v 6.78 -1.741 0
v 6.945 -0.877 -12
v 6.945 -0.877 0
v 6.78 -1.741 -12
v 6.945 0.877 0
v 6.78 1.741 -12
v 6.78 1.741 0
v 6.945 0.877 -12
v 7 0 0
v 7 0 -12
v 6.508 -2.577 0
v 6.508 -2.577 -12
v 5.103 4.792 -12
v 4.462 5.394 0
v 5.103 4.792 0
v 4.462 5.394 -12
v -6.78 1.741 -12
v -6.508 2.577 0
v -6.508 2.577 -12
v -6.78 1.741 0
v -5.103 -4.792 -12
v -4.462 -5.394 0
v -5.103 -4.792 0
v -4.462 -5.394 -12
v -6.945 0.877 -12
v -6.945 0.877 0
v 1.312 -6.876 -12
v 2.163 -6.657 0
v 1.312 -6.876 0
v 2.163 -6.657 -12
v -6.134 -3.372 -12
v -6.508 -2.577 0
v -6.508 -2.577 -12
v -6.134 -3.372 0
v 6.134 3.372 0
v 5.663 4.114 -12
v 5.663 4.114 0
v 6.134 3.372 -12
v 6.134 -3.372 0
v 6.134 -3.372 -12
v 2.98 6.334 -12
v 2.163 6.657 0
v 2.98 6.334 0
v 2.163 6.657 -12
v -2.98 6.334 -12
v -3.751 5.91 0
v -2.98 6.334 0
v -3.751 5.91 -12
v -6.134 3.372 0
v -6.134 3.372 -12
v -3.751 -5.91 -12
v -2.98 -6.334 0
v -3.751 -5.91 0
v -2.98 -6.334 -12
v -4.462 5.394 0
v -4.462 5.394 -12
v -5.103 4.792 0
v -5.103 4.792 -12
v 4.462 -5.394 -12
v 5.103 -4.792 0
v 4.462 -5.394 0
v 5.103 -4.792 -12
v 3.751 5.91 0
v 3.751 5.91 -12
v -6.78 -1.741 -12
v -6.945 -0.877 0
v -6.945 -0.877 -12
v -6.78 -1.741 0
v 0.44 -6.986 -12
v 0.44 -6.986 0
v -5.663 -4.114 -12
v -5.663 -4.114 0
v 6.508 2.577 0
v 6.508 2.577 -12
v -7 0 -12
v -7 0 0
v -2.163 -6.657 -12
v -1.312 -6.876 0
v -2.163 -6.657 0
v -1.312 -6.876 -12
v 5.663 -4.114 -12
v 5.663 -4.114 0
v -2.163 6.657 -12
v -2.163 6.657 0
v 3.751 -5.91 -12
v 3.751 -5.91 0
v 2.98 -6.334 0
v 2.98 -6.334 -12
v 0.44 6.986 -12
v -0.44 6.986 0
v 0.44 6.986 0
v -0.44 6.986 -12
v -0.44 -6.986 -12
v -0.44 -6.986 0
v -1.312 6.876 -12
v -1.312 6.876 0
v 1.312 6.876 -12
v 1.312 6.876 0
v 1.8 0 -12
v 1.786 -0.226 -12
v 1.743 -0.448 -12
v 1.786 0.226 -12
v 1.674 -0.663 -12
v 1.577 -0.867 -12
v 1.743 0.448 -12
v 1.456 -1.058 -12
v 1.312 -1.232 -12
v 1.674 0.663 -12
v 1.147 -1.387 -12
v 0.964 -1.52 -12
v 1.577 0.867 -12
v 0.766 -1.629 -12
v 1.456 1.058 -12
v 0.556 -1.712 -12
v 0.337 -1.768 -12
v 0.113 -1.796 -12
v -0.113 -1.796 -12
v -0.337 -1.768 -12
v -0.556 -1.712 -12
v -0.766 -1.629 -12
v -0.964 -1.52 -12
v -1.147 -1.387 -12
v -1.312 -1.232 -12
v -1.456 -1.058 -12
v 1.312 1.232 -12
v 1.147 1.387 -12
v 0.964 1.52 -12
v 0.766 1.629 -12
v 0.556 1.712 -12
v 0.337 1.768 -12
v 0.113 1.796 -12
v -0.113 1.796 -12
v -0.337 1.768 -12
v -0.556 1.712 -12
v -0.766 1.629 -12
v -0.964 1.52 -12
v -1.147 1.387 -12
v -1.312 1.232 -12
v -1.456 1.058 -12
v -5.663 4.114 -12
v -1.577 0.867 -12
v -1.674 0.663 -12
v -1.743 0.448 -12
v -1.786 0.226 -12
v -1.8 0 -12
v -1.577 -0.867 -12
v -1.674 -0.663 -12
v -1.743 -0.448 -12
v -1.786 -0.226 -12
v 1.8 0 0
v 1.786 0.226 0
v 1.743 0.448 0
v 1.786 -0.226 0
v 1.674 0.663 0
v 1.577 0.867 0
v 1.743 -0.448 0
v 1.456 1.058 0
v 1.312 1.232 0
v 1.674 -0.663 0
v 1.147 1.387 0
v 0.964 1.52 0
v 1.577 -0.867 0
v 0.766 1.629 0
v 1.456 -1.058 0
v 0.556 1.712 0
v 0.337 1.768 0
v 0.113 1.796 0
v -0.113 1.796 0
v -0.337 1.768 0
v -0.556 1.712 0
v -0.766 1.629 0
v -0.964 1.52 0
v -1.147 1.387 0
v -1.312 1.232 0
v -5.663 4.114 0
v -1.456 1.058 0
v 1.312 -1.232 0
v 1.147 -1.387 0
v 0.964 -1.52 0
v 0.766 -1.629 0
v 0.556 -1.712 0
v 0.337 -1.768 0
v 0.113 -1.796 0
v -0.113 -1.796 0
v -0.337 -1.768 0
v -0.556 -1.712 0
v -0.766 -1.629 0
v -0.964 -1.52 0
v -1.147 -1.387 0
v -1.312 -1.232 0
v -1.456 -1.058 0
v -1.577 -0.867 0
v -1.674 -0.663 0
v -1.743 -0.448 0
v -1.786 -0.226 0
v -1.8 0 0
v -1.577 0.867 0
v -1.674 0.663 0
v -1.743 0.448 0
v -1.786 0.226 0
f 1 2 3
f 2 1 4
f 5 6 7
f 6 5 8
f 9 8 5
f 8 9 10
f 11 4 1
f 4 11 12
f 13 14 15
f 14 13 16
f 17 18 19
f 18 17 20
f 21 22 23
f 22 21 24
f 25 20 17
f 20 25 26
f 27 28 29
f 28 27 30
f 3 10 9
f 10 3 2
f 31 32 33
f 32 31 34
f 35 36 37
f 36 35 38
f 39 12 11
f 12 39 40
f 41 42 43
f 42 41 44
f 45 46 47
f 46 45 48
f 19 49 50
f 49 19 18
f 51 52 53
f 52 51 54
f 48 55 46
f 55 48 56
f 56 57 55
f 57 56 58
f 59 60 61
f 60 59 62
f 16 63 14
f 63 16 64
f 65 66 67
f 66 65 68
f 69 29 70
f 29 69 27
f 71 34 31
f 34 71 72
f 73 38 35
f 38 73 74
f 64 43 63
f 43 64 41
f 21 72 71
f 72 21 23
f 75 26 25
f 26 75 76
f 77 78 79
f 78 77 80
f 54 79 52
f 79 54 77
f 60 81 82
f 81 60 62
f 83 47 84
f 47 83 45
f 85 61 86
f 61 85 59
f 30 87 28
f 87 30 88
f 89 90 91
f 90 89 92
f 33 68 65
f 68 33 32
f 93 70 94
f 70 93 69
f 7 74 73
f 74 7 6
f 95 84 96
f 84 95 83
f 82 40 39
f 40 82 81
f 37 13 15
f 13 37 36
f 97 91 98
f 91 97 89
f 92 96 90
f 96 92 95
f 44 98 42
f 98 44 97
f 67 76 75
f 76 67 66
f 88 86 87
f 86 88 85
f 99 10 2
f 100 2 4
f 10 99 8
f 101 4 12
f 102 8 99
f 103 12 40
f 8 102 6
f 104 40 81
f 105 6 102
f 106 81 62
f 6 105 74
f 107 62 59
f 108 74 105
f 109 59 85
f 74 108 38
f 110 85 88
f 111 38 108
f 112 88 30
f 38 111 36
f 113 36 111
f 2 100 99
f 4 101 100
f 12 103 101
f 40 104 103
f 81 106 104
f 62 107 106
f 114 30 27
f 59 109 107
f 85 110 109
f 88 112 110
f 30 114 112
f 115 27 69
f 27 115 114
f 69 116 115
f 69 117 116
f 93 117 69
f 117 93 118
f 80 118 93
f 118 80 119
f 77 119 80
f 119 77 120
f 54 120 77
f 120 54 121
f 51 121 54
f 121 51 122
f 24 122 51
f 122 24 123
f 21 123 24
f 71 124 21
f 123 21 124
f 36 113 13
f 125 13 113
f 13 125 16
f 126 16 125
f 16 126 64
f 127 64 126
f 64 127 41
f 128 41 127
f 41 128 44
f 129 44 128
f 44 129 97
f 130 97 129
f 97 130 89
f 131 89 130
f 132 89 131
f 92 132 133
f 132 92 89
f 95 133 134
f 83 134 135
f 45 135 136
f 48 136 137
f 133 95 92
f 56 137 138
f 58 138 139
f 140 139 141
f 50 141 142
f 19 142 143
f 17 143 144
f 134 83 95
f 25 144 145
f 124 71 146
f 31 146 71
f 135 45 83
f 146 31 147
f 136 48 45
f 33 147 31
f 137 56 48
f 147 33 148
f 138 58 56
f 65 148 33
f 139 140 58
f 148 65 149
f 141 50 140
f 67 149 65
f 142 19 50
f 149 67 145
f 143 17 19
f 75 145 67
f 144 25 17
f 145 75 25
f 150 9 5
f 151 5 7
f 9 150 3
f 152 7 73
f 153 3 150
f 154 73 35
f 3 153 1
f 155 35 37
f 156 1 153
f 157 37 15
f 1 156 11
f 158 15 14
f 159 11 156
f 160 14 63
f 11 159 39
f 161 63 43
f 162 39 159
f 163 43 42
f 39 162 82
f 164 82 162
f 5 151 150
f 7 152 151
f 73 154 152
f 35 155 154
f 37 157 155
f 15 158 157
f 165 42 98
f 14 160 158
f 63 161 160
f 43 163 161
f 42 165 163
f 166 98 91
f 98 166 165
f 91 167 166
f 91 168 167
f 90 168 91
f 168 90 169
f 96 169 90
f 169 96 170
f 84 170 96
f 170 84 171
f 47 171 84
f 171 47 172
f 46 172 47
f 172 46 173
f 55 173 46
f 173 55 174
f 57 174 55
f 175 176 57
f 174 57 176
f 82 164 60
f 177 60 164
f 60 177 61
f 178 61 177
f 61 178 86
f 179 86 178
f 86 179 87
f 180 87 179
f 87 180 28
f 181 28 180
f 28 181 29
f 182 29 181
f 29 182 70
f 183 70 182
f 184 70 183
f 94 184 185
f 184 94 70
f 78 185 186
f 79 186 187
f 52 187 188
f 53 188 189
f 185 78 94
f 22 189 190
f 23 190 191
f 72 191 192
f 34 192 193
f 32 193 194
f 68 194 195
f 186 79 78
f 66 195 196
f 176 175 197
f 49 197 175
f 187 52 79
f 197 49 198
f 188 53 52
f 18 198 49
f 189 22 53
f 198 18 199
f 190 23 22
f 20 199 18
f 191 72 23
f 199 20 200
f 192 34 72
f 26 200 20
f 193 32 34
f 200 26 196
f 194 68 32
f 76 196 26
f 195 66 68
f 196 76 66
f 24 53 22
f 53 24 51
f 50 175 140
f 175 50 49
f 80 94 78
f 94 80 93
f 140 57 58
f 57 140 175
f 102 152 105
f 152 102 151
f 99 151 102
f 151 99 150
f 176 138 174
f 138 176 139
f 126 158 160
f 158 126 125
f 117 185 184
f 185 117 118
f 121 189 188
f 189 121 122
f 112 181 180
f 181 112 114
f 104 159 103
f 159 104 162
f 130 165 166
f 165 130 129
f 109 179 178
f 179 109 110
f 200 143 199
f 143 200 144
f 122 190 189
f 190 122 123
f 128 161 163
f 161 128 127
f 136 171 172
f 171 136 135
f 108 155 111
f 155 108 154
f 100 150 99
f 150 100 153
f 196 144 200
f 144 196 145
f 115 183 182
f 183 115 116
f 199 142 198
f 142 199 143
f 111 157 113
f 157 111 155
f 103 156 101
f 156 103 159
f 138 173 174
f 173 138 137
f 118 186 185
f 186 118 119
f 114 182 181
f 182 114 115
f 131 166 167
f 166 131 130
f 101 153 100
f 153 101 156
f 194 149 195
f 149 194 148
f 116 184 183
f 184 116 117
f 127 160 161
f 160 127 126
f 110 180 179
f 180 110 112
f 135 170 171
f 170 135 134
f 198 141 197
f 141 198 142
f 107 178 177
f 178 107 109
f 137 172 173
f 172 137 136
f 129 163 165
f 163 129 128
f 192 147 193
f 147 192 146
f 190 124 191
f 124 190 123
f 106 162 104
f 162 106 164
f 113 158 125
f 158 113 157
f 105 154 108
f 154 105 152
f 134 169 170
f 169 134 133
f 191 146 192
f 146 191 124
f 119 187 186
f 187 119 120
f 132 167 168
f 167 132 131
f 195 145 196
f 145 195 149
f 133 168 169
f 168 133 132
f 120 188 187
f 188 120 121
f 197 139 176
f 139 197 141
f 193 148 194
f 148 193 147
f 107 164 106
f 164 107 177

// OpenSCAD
$fn = 50;


difference() {
	union() {
		translate(v = [0, 0, -12.0000000000]) {
			cylinder(h = 12, r = 7.0000000000);
		}
		cylinder(h = 0, r = 10.0000000000);
	}
	union() {
		#translate(v = [0, 0, -12]) {
			cylinder(h = 12, r = 1.8000000000);
		}
	}
}
